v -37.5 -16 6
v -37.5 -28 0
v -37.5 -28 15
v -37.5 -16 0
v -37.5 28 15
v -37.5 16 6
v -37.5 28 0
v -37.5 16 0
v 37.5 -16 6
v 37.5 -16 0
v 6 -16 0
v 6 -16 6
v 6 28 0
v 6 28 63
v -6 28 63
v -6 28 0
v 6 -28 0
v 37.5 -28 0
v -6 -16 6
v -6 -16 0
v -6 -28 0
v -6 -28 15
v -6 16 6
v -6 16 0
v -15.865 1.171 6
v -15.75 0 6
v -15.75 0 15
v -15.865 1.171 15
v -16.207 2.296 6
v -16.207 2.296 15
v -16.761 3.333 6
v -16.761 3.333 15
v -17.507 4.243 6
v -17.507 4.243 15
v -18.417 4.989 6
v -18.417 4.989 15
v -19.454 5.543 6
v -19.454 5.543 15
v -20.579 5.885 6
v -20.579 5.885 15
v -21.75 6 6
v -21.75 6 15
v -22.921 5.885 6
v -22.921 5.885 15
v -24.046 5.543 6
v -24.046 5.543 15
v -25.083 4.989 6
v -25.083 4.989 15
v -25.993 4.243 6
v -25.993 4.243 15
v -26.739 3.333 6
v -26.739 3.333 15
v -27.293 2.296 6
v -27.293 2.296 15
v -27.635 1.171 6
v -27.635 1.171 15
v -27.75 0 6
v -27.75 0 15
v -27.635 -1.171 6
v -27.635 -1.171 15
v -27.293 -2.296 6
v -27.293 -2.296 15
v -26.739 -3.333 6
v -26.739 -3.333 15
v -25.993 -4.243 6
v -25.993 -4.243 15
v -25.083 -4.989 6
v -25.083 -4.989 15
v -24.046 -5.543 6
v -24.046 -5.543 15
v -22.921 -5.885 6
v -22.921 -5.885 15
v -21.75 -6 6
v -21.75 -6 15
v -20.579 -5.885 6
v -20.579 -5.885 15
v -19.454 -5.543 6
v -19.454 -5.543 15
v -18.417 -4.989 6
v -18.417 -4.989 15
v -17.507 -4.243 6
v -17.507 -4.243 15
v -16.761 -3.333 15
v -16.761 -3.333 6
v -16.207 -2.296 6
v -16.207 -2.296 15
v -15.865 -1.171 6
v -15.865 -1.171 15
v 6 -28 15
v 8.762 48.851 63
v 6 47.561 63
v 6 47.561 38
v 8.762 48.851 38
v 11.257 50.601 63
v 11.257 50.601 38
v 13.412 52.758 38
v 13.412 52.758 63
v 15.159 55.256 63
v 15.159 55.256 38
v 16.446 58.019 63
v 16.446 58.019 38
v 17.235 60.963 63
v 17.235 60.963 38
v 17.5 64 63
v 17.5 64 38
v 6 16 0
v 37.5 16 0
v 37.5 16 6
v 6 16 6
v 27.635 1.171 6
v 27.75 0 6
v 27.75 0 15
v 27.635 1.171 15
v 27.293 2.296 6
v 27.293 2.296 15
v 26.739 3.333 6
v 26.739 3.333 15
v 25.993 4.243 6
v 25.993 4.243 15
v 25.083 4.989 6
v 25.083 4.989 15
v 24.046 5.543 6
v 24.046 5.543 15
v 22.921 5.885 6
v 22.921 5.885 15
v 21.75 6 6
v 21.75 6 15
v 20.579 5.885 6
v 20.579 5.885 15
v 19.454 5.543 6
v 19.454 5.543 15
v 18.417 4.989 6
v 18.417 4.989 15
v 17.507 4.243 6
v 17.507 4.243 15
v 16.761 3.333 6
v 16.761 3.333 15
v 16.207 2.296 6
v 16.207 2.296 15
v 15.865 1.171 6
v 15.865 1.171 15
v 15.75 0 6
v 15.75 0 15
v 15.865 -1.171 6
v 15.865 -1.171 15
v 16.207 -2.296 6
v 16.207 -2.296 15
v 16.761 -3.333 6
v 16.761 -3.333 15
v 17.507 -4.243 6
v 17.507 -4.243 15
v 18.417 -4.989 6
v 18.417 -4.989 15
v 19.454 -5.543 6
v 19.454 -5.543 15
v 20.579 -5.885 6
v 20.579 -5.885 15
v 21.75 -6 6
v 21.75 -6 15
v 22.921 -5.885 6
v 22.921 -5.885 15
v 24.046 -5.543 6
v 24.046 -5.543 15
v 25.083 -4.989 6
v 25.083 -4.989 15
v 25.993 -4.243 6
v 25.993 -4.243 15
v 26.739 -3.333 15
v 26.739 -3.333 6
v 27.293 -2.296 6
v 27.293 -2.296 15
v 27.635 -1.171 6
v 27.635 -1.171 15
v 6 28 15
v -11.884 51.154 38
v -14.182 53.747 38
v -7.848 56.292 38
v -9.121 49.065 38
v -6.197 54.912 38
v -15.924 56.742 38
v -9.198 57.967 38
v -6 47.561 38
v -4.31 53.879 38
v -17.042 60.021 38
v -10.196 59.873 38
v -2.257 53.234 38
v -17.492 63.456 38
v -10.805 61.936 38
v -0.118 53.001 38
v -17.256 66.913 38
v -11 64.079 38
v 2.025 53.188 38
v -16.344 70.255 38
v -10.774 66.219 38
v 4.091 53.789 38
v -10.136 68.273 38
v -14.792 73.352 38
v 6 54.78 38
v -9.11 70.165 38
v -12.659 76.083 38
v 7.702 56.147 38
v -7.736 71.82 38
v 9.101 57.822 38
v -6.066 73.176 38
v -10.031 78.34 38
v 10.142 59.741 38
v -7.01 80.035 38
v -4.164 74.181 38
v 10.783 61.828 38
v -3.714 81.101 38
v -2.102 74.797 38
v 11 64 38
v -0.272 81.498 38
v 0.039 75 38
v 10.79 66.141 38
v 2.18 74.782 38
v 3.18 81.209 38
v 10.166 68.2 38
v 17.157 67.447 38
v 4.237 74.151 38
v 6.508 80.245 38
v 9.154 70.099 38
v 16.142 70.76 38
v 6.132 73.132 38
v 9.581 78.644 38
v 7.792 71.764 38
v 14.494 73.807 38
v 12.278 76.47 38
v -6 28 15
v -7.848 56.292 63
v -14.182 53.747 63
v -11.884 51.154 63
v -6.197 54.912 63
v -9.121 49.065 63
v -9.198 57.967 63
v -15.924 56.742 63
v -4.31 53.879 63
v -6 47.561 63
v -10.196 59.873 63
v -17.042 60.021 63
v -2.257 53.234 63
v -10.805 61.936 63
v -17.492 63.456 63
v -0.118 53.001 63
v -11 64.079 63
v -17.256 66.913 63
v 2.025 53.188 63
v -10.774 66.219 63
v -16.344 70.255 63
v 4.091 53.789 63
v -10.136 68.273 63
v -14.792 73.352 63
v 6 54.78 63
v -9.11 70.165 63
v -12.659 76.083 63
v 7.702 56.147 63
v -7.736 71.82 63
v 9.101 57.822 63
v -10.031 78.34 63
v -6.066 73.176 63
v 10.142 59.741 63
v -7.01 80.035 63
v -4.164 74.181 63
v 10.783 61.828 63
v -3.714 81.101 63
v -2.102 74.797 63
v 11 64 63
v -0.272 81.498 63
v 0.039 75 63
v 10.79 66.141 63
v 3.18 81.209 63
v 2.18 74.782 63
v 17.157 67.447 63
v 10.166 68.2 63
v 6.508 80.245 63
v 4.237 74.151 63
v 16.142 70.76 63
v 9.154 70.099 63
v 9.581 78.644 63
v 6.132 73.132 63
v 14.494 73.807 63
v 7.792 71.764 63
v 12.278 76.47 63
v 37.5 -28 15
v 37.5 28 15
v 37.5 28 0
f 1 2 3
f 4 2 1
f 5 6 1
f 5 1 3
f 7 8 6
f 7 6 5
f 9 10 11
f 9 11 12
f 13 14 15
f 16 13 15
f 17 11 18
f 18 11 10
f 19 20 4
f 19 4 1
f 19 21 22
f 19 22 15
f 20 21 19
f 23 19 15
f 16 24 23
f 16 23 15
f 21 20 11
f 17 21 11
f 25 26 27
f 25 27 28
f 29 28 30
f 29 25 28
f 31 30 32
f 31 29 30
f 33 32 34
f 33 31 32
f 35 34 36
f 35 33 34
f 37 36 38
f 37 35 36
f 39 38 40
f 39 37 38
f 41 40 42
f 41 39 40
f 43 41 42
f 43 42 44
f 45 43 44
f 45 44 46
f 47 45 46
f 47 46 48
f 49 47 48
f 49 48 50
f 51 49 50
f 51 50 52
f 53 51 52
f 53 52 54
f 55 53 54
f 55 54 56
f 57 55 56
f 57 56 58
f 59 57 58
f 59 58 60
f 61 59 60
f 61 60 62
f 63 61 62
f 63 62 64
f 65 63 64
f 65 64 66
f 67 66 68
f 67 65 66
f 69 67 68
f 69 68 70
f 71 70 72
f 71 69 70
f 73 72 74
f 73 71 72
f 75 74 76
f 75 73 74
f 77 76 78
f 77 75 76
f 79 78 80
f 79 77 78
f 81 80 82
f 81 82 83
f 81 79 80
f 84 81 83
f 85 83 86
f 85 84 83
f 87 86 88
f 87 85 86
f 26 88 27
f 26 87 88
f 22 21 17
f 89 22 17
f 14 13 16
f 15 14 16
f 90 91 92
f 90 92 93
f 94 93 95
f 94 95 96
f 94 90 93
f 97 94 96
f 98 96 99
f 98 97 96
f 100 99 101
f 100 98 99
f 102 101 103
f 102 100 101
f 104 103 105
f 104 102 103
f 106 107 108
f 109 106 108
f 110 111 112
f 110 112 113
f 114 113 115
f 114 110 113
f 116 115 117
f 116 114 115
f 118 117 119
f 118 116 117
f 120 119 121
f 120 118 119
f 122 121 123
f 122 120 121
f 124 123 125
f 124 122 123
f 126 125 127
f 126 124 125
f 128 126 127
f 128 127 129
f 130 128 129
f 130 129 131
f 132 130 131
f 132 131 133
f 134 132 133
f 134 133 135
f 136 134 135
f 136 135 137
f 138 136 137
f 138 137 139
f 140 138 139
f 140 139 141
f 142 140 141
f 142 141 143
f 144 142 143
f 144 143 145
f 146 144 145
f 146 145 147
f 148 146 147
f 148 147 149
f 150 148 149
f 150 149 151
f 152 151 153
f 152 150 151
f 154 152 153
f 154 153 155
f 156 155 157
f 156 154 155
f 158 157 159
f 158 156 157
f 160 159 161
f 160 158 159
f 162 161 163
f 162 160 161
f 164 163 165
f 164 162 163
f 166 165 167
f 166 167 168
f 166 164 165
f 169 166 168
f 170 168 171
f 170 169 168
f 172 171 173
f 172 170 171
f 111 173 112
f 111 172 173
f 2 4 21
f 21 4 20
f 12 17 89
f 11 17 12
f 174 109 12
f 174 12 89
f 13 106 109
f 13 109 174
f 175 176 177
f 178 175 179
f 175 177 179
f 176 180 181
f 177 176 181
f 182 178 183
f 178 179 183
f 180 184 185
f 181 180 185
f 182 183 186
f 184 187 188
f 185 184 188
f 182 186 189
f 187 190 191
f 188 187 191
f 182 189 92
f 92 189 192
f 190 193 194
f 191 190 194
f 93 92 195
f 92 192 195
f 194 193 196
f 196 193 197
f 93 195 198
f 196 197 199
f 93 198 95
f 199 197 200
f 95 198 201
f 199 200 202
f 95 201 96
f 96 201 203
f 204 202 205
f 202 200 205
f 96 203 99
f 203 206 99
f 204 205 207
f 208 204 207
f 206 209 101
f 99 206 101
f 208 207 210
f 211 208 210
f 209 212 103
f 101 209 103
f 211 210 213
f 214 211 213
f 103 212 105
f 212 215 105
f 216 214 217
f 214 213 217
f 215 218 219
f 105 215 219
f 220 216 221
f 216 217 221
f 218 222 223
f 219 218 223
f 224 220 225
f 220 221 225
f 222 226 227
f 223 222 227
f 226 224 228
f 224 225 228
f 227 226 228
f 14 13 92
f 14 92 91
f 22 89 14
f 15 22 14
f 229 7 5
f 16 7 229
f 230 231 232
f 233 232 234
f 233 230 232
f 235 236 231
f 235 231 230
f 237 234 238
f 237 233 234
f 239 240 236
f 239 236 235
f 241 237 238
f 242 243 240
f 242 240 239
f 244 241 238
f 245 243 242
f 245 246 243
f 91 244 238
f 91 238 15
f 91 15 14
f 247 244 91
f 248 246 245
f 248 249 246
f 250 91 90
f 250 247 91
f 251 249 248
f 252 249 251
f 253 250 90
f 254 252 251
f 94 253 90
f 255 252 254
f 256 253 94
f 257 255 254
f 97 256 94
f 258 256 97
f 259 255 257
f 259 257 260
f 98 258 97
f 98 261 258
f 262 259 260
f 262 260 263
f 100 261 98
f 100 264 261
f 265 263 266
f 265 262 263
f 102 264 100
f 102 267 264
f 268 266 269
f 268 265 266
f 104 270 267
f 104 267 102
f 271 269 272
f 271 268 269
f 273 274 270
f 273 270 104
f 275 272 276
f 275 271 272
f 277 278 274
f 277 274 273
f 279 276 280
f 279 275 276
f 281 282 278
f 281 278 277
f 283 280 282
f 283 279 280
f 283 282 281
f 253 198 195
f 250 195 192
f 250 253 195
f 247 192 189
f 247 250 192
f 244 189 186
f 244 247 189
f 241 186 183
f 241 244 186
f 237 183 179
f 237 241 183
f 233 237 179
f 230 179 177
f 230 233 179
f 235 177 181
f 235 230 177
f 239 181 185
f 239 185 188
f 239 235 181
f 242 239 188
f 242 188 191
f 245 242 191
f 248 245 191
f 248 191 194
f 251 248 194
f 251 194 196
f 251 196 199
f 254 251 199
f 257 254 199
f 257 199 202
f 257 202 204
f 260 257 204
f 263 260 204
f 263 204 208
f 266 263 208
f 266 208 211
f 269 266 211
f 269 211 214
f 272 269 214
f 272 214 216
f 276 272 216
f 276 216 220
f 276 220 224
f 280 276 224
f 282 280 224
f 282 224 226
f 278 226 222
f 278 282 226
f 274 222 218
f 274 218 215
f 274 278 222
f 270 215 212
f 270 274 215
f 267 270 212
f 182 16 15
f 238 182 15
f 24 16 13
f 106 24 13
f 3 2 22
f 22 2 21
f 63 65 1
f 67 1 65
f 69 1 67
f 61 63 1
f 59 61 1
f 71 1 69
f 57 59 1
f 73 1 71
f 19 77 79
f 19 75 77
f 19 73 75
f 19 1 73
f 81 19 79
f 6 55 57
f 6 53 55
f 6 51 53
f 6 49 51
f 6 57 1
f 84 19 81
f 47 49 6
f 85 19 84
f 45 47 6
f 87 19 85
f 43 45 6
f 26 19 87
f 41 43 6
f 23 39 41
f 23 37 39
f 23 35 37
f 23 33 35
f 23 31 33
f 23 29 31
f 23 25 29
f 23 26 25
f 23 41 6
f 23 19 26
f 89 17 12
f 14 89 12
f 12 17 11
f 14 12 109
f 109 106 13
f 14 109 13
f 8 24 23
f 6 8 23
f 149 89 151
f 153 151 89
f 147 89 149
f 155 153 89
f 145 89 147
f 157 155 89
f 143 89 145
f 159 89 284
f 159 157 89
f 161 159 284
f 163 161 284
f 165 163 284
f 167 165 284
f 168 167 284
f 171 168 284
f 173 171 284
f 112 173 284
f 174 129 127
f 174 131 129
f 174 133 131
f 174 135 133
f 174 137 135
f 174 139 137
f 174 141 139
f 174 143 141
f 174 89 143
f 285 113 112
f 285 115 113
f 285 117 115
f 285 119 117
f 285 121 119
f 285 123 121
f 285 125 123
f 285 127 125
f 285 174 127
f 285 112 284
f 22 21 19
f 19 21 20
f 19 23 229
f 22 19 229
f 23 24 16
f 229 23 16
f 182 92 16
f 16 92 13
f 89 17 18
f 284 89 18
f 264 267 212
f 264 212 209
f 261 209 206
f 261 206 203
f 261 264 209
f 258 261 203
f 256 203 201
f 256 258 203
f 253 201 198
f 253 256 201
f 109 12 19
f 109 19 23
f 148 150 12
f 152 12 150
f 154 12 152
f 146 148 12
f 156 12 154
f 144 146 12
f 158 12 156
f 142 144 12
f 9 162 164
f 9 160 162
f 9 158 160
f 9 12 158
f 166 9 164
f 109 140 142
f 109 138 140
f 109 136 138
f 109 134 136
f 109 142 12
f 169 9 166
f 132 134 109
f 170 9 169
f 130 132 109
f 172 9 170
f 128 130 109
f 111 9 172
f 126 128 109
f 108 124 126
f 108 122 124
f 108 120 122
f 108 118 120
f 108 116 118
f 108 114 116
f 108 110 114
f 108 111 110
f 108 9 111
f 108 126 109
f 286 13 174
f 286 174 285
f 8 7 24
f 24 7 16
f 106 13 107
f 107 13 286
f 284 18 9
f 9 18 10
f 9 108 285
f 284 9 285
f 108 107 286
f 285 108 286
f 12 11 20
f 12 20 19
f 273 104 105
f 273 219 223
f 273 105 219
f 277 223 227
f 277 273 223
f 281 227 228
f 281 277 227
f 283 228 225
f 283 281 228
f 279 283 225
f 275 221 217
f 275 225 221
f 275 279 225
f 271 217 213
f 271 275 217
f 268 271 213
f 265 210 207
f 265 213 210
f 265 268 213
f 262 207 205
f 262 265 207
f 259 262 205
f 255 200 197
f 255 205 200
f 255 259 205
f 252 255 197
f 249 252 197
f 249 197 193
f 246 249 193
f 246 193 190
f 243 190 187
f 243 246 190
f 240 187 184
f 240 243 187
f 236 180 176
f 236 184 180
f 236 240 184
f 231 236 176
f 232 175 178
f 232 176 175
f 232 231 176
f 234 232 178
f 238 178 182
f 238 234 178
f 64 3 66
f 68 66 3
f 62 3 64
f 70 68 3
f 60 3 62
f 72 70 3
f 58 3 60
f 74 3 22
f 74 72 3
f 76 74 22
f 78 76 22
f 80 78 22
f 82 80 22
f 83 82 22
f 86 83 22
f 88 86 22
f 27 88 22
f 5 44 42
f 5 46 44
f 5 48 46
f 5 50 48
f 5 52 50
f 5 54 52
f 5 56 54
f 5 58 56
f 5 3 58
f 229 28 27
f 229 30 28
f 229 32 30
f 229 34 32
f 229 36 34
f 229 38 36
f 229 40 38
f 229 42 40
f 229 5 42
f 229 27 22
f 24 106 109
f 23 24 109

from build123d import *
from build123d import SkipClean  # not in build123d's __all__

# Parameters (mm, degrees)
F0_W      = 31.5
F0_H      = 56
F0_R      = 6
F1_DEPTH  = 15
F0_W_2    = 6
F2_DEPTH  = 63
F4_DEPTH  = 25
F5_W      = 12
F5_H      = 63
F6_DEPTH  = 36
F8_DEPTH  = 134.4
F9_DEPTH  = 25
F11_DEPTH = 25
F12_W     = 32
F12_H     = 6
F13_DEPTH = 101.3


# Not quite as in the source:
# - after a boolean that leaves OpenCascade's solid faulty, fix() repairs it


with BuildPart() as f1:
    # F0 (on Top) → F1 (new body)
    with BuildSketch(Plane.XY):
        with Locations((-21.75, 0)):
            Rectangle(F0_W, F0_H)
        with Locations((-21.75, 0)):
            Circle(F0_R, mode=Mode.SUBTRACT)
    extrude(amount=F1_DEPTH)


with BuildPart() as f1b:
    # F0 (on Top) → F1, piece 2 (new body)
    with BuildSketch(Plane.XY):
        with Locations((21.75, 0)):
            Rectangle(F0_W, F0_H)
        with Locations((21.75, 0)):
            Circle(F0_R, mode=Mode.SUBTRACT)
    extrude(amount=F1_DEPTH)


with BuildPart() as f2:
    # F0 (on Top) → F2 (new body)
    with BuildSketch(Plane.XY):
        with Locations((-3, 0)):
            Rectangle(F0_W_2, F0_H)
        with Locations((3, 0)):
            Rectangle(F0_W_2, F0_H)
    extrude(amount=F2_DEPTH)

    # F3 (on face) → F4 (cut)
    with BuildSketch(Plane.YZ.offset(6)):
        Polygon((-28, 63), (-28, 15), (28, 63), align=None)
    extrude(amount=-F4_DEPTH, mode=Mode.SUBTRACT)


with BuildPart() as f6:
    # F5 (on face) → F6 (new body)
    with BuildSketch(Plane(origin=(0, 28, 0), x_dir=(-1, 0, 0), z_dir=(0, 1, 0))):
        with Locations((0, 31.5)):
            Rectangle(F5_W, F5_H)
    extrude(amount=F6_DEPTH)

    # F7 (on face) → F8 (cut)
    with BuildSketch(Plane.XY.offset(63)):
        with BuildLine():
            Line((-6, 64), (-6, 54.7804555427))
            ThreePointArc((-6, 54.7804555427), (0, 53), (6, 54.7804555427))
            Line((6, 54.7804555427), (6, 64))
            Line((6, 64), (-6, 64))
        make_face()
    extrude(amount=-F8_DEPTH, mode=Mode.SUBTRACT)

    # F7 (on face) → F9 (join)
    with BuildSketch(Plane.XY.offset(63)):
        with BuildLine():
            ThreePointArc((-6, 54.7804555427), (-5.2440442409, 73.6695398029), (11, 64))
            ThreePointArc((11, 64), (9.6695398029, 58.7559557591), (6, 54.7804555427))
            Line((6, 54.7804555427), (6, 47.5607177772))
            ThreePointArc((6, 47.5607177772), (14.3396303997, 53.9687986761), (17.5, 64))
            ThreePointArc((17.5, 64), (-10.0312013239, 78.3396303997), (-6, 47.5607177772))
            Line((-6, 47.5607177772), (-6, 54.7804555427))
        make_face()
        with BuildLine():
            ThreePointArc((6, 54.7804555427), (0, 53), (-6, 54.7804555427))
            Line((-6, 54.7804555427), (-6, 47.5607177772))
            ThreePointArc((-6, 47.5607177772), (0, 46.5), (6, 47.5607177772))
            Line((6, 47.5607177772), (6, 54.7804555427))
        make_face()
        with BuildLine():
            ThreePointArc((6, 47.5607177772), (0, 46.5), (-6, 47.5607177772))
            Line((-6, 47.5607177772), (-6, 28))
            Line((-6, 28), (6, 28))
            Line((6, 28), (6, 47.5607177772))
        make_face()
    with SkipClean():  # cleaning this boolean's faces spoils the solid; the shape is the same uncleaned
        extrude(amount=-F9_DEPTH)

    # F10 (on face) → F11 (cut)
    with BuildSketch(Plane.YZ.offset(6)):
        Polygon((28, 0), (54.7804555427, 0), (54.7804555427, 38), (47.5607177772, 38), align=None)
    extrude(amount=-F11_DEPTH, mode=Mode.SUBTRACT)

    add(f6.part.fix(), mode=Mode.REPLACE)


with BuildPart() as f13_tool:
    # F12 (on face) → F13 (new body)
    with BuildSketch(Plane.YZ.offset(37.5)):
        with Locations((0, 3)):
            Rectangle(F12_W, F12_H)
    extrude(amount=-F13_DEPTH)


with BuildPart() as f1_1:
    add(f1.part, clean=False)

    # F13: cut by f13_tool
    add(f13_tool.part, mode=Mode.SUBTRACT)


with BuildPart() as f1b_1:
    add(f1b.part, clean=False)

    # F13: cut by f13_tool
    add(f13_tool.part, mode=Mode.SUBTRACT)


with BuildPart() as f2_1:
    add(f2.part, clean=False)

    # F13: cut by f13_tool
    add(f13_tool.part, mode=Mode.SUBTRACT)


solid = Compound([f6.part, f1_1.part, f1b_1.part, f2_1.part])
